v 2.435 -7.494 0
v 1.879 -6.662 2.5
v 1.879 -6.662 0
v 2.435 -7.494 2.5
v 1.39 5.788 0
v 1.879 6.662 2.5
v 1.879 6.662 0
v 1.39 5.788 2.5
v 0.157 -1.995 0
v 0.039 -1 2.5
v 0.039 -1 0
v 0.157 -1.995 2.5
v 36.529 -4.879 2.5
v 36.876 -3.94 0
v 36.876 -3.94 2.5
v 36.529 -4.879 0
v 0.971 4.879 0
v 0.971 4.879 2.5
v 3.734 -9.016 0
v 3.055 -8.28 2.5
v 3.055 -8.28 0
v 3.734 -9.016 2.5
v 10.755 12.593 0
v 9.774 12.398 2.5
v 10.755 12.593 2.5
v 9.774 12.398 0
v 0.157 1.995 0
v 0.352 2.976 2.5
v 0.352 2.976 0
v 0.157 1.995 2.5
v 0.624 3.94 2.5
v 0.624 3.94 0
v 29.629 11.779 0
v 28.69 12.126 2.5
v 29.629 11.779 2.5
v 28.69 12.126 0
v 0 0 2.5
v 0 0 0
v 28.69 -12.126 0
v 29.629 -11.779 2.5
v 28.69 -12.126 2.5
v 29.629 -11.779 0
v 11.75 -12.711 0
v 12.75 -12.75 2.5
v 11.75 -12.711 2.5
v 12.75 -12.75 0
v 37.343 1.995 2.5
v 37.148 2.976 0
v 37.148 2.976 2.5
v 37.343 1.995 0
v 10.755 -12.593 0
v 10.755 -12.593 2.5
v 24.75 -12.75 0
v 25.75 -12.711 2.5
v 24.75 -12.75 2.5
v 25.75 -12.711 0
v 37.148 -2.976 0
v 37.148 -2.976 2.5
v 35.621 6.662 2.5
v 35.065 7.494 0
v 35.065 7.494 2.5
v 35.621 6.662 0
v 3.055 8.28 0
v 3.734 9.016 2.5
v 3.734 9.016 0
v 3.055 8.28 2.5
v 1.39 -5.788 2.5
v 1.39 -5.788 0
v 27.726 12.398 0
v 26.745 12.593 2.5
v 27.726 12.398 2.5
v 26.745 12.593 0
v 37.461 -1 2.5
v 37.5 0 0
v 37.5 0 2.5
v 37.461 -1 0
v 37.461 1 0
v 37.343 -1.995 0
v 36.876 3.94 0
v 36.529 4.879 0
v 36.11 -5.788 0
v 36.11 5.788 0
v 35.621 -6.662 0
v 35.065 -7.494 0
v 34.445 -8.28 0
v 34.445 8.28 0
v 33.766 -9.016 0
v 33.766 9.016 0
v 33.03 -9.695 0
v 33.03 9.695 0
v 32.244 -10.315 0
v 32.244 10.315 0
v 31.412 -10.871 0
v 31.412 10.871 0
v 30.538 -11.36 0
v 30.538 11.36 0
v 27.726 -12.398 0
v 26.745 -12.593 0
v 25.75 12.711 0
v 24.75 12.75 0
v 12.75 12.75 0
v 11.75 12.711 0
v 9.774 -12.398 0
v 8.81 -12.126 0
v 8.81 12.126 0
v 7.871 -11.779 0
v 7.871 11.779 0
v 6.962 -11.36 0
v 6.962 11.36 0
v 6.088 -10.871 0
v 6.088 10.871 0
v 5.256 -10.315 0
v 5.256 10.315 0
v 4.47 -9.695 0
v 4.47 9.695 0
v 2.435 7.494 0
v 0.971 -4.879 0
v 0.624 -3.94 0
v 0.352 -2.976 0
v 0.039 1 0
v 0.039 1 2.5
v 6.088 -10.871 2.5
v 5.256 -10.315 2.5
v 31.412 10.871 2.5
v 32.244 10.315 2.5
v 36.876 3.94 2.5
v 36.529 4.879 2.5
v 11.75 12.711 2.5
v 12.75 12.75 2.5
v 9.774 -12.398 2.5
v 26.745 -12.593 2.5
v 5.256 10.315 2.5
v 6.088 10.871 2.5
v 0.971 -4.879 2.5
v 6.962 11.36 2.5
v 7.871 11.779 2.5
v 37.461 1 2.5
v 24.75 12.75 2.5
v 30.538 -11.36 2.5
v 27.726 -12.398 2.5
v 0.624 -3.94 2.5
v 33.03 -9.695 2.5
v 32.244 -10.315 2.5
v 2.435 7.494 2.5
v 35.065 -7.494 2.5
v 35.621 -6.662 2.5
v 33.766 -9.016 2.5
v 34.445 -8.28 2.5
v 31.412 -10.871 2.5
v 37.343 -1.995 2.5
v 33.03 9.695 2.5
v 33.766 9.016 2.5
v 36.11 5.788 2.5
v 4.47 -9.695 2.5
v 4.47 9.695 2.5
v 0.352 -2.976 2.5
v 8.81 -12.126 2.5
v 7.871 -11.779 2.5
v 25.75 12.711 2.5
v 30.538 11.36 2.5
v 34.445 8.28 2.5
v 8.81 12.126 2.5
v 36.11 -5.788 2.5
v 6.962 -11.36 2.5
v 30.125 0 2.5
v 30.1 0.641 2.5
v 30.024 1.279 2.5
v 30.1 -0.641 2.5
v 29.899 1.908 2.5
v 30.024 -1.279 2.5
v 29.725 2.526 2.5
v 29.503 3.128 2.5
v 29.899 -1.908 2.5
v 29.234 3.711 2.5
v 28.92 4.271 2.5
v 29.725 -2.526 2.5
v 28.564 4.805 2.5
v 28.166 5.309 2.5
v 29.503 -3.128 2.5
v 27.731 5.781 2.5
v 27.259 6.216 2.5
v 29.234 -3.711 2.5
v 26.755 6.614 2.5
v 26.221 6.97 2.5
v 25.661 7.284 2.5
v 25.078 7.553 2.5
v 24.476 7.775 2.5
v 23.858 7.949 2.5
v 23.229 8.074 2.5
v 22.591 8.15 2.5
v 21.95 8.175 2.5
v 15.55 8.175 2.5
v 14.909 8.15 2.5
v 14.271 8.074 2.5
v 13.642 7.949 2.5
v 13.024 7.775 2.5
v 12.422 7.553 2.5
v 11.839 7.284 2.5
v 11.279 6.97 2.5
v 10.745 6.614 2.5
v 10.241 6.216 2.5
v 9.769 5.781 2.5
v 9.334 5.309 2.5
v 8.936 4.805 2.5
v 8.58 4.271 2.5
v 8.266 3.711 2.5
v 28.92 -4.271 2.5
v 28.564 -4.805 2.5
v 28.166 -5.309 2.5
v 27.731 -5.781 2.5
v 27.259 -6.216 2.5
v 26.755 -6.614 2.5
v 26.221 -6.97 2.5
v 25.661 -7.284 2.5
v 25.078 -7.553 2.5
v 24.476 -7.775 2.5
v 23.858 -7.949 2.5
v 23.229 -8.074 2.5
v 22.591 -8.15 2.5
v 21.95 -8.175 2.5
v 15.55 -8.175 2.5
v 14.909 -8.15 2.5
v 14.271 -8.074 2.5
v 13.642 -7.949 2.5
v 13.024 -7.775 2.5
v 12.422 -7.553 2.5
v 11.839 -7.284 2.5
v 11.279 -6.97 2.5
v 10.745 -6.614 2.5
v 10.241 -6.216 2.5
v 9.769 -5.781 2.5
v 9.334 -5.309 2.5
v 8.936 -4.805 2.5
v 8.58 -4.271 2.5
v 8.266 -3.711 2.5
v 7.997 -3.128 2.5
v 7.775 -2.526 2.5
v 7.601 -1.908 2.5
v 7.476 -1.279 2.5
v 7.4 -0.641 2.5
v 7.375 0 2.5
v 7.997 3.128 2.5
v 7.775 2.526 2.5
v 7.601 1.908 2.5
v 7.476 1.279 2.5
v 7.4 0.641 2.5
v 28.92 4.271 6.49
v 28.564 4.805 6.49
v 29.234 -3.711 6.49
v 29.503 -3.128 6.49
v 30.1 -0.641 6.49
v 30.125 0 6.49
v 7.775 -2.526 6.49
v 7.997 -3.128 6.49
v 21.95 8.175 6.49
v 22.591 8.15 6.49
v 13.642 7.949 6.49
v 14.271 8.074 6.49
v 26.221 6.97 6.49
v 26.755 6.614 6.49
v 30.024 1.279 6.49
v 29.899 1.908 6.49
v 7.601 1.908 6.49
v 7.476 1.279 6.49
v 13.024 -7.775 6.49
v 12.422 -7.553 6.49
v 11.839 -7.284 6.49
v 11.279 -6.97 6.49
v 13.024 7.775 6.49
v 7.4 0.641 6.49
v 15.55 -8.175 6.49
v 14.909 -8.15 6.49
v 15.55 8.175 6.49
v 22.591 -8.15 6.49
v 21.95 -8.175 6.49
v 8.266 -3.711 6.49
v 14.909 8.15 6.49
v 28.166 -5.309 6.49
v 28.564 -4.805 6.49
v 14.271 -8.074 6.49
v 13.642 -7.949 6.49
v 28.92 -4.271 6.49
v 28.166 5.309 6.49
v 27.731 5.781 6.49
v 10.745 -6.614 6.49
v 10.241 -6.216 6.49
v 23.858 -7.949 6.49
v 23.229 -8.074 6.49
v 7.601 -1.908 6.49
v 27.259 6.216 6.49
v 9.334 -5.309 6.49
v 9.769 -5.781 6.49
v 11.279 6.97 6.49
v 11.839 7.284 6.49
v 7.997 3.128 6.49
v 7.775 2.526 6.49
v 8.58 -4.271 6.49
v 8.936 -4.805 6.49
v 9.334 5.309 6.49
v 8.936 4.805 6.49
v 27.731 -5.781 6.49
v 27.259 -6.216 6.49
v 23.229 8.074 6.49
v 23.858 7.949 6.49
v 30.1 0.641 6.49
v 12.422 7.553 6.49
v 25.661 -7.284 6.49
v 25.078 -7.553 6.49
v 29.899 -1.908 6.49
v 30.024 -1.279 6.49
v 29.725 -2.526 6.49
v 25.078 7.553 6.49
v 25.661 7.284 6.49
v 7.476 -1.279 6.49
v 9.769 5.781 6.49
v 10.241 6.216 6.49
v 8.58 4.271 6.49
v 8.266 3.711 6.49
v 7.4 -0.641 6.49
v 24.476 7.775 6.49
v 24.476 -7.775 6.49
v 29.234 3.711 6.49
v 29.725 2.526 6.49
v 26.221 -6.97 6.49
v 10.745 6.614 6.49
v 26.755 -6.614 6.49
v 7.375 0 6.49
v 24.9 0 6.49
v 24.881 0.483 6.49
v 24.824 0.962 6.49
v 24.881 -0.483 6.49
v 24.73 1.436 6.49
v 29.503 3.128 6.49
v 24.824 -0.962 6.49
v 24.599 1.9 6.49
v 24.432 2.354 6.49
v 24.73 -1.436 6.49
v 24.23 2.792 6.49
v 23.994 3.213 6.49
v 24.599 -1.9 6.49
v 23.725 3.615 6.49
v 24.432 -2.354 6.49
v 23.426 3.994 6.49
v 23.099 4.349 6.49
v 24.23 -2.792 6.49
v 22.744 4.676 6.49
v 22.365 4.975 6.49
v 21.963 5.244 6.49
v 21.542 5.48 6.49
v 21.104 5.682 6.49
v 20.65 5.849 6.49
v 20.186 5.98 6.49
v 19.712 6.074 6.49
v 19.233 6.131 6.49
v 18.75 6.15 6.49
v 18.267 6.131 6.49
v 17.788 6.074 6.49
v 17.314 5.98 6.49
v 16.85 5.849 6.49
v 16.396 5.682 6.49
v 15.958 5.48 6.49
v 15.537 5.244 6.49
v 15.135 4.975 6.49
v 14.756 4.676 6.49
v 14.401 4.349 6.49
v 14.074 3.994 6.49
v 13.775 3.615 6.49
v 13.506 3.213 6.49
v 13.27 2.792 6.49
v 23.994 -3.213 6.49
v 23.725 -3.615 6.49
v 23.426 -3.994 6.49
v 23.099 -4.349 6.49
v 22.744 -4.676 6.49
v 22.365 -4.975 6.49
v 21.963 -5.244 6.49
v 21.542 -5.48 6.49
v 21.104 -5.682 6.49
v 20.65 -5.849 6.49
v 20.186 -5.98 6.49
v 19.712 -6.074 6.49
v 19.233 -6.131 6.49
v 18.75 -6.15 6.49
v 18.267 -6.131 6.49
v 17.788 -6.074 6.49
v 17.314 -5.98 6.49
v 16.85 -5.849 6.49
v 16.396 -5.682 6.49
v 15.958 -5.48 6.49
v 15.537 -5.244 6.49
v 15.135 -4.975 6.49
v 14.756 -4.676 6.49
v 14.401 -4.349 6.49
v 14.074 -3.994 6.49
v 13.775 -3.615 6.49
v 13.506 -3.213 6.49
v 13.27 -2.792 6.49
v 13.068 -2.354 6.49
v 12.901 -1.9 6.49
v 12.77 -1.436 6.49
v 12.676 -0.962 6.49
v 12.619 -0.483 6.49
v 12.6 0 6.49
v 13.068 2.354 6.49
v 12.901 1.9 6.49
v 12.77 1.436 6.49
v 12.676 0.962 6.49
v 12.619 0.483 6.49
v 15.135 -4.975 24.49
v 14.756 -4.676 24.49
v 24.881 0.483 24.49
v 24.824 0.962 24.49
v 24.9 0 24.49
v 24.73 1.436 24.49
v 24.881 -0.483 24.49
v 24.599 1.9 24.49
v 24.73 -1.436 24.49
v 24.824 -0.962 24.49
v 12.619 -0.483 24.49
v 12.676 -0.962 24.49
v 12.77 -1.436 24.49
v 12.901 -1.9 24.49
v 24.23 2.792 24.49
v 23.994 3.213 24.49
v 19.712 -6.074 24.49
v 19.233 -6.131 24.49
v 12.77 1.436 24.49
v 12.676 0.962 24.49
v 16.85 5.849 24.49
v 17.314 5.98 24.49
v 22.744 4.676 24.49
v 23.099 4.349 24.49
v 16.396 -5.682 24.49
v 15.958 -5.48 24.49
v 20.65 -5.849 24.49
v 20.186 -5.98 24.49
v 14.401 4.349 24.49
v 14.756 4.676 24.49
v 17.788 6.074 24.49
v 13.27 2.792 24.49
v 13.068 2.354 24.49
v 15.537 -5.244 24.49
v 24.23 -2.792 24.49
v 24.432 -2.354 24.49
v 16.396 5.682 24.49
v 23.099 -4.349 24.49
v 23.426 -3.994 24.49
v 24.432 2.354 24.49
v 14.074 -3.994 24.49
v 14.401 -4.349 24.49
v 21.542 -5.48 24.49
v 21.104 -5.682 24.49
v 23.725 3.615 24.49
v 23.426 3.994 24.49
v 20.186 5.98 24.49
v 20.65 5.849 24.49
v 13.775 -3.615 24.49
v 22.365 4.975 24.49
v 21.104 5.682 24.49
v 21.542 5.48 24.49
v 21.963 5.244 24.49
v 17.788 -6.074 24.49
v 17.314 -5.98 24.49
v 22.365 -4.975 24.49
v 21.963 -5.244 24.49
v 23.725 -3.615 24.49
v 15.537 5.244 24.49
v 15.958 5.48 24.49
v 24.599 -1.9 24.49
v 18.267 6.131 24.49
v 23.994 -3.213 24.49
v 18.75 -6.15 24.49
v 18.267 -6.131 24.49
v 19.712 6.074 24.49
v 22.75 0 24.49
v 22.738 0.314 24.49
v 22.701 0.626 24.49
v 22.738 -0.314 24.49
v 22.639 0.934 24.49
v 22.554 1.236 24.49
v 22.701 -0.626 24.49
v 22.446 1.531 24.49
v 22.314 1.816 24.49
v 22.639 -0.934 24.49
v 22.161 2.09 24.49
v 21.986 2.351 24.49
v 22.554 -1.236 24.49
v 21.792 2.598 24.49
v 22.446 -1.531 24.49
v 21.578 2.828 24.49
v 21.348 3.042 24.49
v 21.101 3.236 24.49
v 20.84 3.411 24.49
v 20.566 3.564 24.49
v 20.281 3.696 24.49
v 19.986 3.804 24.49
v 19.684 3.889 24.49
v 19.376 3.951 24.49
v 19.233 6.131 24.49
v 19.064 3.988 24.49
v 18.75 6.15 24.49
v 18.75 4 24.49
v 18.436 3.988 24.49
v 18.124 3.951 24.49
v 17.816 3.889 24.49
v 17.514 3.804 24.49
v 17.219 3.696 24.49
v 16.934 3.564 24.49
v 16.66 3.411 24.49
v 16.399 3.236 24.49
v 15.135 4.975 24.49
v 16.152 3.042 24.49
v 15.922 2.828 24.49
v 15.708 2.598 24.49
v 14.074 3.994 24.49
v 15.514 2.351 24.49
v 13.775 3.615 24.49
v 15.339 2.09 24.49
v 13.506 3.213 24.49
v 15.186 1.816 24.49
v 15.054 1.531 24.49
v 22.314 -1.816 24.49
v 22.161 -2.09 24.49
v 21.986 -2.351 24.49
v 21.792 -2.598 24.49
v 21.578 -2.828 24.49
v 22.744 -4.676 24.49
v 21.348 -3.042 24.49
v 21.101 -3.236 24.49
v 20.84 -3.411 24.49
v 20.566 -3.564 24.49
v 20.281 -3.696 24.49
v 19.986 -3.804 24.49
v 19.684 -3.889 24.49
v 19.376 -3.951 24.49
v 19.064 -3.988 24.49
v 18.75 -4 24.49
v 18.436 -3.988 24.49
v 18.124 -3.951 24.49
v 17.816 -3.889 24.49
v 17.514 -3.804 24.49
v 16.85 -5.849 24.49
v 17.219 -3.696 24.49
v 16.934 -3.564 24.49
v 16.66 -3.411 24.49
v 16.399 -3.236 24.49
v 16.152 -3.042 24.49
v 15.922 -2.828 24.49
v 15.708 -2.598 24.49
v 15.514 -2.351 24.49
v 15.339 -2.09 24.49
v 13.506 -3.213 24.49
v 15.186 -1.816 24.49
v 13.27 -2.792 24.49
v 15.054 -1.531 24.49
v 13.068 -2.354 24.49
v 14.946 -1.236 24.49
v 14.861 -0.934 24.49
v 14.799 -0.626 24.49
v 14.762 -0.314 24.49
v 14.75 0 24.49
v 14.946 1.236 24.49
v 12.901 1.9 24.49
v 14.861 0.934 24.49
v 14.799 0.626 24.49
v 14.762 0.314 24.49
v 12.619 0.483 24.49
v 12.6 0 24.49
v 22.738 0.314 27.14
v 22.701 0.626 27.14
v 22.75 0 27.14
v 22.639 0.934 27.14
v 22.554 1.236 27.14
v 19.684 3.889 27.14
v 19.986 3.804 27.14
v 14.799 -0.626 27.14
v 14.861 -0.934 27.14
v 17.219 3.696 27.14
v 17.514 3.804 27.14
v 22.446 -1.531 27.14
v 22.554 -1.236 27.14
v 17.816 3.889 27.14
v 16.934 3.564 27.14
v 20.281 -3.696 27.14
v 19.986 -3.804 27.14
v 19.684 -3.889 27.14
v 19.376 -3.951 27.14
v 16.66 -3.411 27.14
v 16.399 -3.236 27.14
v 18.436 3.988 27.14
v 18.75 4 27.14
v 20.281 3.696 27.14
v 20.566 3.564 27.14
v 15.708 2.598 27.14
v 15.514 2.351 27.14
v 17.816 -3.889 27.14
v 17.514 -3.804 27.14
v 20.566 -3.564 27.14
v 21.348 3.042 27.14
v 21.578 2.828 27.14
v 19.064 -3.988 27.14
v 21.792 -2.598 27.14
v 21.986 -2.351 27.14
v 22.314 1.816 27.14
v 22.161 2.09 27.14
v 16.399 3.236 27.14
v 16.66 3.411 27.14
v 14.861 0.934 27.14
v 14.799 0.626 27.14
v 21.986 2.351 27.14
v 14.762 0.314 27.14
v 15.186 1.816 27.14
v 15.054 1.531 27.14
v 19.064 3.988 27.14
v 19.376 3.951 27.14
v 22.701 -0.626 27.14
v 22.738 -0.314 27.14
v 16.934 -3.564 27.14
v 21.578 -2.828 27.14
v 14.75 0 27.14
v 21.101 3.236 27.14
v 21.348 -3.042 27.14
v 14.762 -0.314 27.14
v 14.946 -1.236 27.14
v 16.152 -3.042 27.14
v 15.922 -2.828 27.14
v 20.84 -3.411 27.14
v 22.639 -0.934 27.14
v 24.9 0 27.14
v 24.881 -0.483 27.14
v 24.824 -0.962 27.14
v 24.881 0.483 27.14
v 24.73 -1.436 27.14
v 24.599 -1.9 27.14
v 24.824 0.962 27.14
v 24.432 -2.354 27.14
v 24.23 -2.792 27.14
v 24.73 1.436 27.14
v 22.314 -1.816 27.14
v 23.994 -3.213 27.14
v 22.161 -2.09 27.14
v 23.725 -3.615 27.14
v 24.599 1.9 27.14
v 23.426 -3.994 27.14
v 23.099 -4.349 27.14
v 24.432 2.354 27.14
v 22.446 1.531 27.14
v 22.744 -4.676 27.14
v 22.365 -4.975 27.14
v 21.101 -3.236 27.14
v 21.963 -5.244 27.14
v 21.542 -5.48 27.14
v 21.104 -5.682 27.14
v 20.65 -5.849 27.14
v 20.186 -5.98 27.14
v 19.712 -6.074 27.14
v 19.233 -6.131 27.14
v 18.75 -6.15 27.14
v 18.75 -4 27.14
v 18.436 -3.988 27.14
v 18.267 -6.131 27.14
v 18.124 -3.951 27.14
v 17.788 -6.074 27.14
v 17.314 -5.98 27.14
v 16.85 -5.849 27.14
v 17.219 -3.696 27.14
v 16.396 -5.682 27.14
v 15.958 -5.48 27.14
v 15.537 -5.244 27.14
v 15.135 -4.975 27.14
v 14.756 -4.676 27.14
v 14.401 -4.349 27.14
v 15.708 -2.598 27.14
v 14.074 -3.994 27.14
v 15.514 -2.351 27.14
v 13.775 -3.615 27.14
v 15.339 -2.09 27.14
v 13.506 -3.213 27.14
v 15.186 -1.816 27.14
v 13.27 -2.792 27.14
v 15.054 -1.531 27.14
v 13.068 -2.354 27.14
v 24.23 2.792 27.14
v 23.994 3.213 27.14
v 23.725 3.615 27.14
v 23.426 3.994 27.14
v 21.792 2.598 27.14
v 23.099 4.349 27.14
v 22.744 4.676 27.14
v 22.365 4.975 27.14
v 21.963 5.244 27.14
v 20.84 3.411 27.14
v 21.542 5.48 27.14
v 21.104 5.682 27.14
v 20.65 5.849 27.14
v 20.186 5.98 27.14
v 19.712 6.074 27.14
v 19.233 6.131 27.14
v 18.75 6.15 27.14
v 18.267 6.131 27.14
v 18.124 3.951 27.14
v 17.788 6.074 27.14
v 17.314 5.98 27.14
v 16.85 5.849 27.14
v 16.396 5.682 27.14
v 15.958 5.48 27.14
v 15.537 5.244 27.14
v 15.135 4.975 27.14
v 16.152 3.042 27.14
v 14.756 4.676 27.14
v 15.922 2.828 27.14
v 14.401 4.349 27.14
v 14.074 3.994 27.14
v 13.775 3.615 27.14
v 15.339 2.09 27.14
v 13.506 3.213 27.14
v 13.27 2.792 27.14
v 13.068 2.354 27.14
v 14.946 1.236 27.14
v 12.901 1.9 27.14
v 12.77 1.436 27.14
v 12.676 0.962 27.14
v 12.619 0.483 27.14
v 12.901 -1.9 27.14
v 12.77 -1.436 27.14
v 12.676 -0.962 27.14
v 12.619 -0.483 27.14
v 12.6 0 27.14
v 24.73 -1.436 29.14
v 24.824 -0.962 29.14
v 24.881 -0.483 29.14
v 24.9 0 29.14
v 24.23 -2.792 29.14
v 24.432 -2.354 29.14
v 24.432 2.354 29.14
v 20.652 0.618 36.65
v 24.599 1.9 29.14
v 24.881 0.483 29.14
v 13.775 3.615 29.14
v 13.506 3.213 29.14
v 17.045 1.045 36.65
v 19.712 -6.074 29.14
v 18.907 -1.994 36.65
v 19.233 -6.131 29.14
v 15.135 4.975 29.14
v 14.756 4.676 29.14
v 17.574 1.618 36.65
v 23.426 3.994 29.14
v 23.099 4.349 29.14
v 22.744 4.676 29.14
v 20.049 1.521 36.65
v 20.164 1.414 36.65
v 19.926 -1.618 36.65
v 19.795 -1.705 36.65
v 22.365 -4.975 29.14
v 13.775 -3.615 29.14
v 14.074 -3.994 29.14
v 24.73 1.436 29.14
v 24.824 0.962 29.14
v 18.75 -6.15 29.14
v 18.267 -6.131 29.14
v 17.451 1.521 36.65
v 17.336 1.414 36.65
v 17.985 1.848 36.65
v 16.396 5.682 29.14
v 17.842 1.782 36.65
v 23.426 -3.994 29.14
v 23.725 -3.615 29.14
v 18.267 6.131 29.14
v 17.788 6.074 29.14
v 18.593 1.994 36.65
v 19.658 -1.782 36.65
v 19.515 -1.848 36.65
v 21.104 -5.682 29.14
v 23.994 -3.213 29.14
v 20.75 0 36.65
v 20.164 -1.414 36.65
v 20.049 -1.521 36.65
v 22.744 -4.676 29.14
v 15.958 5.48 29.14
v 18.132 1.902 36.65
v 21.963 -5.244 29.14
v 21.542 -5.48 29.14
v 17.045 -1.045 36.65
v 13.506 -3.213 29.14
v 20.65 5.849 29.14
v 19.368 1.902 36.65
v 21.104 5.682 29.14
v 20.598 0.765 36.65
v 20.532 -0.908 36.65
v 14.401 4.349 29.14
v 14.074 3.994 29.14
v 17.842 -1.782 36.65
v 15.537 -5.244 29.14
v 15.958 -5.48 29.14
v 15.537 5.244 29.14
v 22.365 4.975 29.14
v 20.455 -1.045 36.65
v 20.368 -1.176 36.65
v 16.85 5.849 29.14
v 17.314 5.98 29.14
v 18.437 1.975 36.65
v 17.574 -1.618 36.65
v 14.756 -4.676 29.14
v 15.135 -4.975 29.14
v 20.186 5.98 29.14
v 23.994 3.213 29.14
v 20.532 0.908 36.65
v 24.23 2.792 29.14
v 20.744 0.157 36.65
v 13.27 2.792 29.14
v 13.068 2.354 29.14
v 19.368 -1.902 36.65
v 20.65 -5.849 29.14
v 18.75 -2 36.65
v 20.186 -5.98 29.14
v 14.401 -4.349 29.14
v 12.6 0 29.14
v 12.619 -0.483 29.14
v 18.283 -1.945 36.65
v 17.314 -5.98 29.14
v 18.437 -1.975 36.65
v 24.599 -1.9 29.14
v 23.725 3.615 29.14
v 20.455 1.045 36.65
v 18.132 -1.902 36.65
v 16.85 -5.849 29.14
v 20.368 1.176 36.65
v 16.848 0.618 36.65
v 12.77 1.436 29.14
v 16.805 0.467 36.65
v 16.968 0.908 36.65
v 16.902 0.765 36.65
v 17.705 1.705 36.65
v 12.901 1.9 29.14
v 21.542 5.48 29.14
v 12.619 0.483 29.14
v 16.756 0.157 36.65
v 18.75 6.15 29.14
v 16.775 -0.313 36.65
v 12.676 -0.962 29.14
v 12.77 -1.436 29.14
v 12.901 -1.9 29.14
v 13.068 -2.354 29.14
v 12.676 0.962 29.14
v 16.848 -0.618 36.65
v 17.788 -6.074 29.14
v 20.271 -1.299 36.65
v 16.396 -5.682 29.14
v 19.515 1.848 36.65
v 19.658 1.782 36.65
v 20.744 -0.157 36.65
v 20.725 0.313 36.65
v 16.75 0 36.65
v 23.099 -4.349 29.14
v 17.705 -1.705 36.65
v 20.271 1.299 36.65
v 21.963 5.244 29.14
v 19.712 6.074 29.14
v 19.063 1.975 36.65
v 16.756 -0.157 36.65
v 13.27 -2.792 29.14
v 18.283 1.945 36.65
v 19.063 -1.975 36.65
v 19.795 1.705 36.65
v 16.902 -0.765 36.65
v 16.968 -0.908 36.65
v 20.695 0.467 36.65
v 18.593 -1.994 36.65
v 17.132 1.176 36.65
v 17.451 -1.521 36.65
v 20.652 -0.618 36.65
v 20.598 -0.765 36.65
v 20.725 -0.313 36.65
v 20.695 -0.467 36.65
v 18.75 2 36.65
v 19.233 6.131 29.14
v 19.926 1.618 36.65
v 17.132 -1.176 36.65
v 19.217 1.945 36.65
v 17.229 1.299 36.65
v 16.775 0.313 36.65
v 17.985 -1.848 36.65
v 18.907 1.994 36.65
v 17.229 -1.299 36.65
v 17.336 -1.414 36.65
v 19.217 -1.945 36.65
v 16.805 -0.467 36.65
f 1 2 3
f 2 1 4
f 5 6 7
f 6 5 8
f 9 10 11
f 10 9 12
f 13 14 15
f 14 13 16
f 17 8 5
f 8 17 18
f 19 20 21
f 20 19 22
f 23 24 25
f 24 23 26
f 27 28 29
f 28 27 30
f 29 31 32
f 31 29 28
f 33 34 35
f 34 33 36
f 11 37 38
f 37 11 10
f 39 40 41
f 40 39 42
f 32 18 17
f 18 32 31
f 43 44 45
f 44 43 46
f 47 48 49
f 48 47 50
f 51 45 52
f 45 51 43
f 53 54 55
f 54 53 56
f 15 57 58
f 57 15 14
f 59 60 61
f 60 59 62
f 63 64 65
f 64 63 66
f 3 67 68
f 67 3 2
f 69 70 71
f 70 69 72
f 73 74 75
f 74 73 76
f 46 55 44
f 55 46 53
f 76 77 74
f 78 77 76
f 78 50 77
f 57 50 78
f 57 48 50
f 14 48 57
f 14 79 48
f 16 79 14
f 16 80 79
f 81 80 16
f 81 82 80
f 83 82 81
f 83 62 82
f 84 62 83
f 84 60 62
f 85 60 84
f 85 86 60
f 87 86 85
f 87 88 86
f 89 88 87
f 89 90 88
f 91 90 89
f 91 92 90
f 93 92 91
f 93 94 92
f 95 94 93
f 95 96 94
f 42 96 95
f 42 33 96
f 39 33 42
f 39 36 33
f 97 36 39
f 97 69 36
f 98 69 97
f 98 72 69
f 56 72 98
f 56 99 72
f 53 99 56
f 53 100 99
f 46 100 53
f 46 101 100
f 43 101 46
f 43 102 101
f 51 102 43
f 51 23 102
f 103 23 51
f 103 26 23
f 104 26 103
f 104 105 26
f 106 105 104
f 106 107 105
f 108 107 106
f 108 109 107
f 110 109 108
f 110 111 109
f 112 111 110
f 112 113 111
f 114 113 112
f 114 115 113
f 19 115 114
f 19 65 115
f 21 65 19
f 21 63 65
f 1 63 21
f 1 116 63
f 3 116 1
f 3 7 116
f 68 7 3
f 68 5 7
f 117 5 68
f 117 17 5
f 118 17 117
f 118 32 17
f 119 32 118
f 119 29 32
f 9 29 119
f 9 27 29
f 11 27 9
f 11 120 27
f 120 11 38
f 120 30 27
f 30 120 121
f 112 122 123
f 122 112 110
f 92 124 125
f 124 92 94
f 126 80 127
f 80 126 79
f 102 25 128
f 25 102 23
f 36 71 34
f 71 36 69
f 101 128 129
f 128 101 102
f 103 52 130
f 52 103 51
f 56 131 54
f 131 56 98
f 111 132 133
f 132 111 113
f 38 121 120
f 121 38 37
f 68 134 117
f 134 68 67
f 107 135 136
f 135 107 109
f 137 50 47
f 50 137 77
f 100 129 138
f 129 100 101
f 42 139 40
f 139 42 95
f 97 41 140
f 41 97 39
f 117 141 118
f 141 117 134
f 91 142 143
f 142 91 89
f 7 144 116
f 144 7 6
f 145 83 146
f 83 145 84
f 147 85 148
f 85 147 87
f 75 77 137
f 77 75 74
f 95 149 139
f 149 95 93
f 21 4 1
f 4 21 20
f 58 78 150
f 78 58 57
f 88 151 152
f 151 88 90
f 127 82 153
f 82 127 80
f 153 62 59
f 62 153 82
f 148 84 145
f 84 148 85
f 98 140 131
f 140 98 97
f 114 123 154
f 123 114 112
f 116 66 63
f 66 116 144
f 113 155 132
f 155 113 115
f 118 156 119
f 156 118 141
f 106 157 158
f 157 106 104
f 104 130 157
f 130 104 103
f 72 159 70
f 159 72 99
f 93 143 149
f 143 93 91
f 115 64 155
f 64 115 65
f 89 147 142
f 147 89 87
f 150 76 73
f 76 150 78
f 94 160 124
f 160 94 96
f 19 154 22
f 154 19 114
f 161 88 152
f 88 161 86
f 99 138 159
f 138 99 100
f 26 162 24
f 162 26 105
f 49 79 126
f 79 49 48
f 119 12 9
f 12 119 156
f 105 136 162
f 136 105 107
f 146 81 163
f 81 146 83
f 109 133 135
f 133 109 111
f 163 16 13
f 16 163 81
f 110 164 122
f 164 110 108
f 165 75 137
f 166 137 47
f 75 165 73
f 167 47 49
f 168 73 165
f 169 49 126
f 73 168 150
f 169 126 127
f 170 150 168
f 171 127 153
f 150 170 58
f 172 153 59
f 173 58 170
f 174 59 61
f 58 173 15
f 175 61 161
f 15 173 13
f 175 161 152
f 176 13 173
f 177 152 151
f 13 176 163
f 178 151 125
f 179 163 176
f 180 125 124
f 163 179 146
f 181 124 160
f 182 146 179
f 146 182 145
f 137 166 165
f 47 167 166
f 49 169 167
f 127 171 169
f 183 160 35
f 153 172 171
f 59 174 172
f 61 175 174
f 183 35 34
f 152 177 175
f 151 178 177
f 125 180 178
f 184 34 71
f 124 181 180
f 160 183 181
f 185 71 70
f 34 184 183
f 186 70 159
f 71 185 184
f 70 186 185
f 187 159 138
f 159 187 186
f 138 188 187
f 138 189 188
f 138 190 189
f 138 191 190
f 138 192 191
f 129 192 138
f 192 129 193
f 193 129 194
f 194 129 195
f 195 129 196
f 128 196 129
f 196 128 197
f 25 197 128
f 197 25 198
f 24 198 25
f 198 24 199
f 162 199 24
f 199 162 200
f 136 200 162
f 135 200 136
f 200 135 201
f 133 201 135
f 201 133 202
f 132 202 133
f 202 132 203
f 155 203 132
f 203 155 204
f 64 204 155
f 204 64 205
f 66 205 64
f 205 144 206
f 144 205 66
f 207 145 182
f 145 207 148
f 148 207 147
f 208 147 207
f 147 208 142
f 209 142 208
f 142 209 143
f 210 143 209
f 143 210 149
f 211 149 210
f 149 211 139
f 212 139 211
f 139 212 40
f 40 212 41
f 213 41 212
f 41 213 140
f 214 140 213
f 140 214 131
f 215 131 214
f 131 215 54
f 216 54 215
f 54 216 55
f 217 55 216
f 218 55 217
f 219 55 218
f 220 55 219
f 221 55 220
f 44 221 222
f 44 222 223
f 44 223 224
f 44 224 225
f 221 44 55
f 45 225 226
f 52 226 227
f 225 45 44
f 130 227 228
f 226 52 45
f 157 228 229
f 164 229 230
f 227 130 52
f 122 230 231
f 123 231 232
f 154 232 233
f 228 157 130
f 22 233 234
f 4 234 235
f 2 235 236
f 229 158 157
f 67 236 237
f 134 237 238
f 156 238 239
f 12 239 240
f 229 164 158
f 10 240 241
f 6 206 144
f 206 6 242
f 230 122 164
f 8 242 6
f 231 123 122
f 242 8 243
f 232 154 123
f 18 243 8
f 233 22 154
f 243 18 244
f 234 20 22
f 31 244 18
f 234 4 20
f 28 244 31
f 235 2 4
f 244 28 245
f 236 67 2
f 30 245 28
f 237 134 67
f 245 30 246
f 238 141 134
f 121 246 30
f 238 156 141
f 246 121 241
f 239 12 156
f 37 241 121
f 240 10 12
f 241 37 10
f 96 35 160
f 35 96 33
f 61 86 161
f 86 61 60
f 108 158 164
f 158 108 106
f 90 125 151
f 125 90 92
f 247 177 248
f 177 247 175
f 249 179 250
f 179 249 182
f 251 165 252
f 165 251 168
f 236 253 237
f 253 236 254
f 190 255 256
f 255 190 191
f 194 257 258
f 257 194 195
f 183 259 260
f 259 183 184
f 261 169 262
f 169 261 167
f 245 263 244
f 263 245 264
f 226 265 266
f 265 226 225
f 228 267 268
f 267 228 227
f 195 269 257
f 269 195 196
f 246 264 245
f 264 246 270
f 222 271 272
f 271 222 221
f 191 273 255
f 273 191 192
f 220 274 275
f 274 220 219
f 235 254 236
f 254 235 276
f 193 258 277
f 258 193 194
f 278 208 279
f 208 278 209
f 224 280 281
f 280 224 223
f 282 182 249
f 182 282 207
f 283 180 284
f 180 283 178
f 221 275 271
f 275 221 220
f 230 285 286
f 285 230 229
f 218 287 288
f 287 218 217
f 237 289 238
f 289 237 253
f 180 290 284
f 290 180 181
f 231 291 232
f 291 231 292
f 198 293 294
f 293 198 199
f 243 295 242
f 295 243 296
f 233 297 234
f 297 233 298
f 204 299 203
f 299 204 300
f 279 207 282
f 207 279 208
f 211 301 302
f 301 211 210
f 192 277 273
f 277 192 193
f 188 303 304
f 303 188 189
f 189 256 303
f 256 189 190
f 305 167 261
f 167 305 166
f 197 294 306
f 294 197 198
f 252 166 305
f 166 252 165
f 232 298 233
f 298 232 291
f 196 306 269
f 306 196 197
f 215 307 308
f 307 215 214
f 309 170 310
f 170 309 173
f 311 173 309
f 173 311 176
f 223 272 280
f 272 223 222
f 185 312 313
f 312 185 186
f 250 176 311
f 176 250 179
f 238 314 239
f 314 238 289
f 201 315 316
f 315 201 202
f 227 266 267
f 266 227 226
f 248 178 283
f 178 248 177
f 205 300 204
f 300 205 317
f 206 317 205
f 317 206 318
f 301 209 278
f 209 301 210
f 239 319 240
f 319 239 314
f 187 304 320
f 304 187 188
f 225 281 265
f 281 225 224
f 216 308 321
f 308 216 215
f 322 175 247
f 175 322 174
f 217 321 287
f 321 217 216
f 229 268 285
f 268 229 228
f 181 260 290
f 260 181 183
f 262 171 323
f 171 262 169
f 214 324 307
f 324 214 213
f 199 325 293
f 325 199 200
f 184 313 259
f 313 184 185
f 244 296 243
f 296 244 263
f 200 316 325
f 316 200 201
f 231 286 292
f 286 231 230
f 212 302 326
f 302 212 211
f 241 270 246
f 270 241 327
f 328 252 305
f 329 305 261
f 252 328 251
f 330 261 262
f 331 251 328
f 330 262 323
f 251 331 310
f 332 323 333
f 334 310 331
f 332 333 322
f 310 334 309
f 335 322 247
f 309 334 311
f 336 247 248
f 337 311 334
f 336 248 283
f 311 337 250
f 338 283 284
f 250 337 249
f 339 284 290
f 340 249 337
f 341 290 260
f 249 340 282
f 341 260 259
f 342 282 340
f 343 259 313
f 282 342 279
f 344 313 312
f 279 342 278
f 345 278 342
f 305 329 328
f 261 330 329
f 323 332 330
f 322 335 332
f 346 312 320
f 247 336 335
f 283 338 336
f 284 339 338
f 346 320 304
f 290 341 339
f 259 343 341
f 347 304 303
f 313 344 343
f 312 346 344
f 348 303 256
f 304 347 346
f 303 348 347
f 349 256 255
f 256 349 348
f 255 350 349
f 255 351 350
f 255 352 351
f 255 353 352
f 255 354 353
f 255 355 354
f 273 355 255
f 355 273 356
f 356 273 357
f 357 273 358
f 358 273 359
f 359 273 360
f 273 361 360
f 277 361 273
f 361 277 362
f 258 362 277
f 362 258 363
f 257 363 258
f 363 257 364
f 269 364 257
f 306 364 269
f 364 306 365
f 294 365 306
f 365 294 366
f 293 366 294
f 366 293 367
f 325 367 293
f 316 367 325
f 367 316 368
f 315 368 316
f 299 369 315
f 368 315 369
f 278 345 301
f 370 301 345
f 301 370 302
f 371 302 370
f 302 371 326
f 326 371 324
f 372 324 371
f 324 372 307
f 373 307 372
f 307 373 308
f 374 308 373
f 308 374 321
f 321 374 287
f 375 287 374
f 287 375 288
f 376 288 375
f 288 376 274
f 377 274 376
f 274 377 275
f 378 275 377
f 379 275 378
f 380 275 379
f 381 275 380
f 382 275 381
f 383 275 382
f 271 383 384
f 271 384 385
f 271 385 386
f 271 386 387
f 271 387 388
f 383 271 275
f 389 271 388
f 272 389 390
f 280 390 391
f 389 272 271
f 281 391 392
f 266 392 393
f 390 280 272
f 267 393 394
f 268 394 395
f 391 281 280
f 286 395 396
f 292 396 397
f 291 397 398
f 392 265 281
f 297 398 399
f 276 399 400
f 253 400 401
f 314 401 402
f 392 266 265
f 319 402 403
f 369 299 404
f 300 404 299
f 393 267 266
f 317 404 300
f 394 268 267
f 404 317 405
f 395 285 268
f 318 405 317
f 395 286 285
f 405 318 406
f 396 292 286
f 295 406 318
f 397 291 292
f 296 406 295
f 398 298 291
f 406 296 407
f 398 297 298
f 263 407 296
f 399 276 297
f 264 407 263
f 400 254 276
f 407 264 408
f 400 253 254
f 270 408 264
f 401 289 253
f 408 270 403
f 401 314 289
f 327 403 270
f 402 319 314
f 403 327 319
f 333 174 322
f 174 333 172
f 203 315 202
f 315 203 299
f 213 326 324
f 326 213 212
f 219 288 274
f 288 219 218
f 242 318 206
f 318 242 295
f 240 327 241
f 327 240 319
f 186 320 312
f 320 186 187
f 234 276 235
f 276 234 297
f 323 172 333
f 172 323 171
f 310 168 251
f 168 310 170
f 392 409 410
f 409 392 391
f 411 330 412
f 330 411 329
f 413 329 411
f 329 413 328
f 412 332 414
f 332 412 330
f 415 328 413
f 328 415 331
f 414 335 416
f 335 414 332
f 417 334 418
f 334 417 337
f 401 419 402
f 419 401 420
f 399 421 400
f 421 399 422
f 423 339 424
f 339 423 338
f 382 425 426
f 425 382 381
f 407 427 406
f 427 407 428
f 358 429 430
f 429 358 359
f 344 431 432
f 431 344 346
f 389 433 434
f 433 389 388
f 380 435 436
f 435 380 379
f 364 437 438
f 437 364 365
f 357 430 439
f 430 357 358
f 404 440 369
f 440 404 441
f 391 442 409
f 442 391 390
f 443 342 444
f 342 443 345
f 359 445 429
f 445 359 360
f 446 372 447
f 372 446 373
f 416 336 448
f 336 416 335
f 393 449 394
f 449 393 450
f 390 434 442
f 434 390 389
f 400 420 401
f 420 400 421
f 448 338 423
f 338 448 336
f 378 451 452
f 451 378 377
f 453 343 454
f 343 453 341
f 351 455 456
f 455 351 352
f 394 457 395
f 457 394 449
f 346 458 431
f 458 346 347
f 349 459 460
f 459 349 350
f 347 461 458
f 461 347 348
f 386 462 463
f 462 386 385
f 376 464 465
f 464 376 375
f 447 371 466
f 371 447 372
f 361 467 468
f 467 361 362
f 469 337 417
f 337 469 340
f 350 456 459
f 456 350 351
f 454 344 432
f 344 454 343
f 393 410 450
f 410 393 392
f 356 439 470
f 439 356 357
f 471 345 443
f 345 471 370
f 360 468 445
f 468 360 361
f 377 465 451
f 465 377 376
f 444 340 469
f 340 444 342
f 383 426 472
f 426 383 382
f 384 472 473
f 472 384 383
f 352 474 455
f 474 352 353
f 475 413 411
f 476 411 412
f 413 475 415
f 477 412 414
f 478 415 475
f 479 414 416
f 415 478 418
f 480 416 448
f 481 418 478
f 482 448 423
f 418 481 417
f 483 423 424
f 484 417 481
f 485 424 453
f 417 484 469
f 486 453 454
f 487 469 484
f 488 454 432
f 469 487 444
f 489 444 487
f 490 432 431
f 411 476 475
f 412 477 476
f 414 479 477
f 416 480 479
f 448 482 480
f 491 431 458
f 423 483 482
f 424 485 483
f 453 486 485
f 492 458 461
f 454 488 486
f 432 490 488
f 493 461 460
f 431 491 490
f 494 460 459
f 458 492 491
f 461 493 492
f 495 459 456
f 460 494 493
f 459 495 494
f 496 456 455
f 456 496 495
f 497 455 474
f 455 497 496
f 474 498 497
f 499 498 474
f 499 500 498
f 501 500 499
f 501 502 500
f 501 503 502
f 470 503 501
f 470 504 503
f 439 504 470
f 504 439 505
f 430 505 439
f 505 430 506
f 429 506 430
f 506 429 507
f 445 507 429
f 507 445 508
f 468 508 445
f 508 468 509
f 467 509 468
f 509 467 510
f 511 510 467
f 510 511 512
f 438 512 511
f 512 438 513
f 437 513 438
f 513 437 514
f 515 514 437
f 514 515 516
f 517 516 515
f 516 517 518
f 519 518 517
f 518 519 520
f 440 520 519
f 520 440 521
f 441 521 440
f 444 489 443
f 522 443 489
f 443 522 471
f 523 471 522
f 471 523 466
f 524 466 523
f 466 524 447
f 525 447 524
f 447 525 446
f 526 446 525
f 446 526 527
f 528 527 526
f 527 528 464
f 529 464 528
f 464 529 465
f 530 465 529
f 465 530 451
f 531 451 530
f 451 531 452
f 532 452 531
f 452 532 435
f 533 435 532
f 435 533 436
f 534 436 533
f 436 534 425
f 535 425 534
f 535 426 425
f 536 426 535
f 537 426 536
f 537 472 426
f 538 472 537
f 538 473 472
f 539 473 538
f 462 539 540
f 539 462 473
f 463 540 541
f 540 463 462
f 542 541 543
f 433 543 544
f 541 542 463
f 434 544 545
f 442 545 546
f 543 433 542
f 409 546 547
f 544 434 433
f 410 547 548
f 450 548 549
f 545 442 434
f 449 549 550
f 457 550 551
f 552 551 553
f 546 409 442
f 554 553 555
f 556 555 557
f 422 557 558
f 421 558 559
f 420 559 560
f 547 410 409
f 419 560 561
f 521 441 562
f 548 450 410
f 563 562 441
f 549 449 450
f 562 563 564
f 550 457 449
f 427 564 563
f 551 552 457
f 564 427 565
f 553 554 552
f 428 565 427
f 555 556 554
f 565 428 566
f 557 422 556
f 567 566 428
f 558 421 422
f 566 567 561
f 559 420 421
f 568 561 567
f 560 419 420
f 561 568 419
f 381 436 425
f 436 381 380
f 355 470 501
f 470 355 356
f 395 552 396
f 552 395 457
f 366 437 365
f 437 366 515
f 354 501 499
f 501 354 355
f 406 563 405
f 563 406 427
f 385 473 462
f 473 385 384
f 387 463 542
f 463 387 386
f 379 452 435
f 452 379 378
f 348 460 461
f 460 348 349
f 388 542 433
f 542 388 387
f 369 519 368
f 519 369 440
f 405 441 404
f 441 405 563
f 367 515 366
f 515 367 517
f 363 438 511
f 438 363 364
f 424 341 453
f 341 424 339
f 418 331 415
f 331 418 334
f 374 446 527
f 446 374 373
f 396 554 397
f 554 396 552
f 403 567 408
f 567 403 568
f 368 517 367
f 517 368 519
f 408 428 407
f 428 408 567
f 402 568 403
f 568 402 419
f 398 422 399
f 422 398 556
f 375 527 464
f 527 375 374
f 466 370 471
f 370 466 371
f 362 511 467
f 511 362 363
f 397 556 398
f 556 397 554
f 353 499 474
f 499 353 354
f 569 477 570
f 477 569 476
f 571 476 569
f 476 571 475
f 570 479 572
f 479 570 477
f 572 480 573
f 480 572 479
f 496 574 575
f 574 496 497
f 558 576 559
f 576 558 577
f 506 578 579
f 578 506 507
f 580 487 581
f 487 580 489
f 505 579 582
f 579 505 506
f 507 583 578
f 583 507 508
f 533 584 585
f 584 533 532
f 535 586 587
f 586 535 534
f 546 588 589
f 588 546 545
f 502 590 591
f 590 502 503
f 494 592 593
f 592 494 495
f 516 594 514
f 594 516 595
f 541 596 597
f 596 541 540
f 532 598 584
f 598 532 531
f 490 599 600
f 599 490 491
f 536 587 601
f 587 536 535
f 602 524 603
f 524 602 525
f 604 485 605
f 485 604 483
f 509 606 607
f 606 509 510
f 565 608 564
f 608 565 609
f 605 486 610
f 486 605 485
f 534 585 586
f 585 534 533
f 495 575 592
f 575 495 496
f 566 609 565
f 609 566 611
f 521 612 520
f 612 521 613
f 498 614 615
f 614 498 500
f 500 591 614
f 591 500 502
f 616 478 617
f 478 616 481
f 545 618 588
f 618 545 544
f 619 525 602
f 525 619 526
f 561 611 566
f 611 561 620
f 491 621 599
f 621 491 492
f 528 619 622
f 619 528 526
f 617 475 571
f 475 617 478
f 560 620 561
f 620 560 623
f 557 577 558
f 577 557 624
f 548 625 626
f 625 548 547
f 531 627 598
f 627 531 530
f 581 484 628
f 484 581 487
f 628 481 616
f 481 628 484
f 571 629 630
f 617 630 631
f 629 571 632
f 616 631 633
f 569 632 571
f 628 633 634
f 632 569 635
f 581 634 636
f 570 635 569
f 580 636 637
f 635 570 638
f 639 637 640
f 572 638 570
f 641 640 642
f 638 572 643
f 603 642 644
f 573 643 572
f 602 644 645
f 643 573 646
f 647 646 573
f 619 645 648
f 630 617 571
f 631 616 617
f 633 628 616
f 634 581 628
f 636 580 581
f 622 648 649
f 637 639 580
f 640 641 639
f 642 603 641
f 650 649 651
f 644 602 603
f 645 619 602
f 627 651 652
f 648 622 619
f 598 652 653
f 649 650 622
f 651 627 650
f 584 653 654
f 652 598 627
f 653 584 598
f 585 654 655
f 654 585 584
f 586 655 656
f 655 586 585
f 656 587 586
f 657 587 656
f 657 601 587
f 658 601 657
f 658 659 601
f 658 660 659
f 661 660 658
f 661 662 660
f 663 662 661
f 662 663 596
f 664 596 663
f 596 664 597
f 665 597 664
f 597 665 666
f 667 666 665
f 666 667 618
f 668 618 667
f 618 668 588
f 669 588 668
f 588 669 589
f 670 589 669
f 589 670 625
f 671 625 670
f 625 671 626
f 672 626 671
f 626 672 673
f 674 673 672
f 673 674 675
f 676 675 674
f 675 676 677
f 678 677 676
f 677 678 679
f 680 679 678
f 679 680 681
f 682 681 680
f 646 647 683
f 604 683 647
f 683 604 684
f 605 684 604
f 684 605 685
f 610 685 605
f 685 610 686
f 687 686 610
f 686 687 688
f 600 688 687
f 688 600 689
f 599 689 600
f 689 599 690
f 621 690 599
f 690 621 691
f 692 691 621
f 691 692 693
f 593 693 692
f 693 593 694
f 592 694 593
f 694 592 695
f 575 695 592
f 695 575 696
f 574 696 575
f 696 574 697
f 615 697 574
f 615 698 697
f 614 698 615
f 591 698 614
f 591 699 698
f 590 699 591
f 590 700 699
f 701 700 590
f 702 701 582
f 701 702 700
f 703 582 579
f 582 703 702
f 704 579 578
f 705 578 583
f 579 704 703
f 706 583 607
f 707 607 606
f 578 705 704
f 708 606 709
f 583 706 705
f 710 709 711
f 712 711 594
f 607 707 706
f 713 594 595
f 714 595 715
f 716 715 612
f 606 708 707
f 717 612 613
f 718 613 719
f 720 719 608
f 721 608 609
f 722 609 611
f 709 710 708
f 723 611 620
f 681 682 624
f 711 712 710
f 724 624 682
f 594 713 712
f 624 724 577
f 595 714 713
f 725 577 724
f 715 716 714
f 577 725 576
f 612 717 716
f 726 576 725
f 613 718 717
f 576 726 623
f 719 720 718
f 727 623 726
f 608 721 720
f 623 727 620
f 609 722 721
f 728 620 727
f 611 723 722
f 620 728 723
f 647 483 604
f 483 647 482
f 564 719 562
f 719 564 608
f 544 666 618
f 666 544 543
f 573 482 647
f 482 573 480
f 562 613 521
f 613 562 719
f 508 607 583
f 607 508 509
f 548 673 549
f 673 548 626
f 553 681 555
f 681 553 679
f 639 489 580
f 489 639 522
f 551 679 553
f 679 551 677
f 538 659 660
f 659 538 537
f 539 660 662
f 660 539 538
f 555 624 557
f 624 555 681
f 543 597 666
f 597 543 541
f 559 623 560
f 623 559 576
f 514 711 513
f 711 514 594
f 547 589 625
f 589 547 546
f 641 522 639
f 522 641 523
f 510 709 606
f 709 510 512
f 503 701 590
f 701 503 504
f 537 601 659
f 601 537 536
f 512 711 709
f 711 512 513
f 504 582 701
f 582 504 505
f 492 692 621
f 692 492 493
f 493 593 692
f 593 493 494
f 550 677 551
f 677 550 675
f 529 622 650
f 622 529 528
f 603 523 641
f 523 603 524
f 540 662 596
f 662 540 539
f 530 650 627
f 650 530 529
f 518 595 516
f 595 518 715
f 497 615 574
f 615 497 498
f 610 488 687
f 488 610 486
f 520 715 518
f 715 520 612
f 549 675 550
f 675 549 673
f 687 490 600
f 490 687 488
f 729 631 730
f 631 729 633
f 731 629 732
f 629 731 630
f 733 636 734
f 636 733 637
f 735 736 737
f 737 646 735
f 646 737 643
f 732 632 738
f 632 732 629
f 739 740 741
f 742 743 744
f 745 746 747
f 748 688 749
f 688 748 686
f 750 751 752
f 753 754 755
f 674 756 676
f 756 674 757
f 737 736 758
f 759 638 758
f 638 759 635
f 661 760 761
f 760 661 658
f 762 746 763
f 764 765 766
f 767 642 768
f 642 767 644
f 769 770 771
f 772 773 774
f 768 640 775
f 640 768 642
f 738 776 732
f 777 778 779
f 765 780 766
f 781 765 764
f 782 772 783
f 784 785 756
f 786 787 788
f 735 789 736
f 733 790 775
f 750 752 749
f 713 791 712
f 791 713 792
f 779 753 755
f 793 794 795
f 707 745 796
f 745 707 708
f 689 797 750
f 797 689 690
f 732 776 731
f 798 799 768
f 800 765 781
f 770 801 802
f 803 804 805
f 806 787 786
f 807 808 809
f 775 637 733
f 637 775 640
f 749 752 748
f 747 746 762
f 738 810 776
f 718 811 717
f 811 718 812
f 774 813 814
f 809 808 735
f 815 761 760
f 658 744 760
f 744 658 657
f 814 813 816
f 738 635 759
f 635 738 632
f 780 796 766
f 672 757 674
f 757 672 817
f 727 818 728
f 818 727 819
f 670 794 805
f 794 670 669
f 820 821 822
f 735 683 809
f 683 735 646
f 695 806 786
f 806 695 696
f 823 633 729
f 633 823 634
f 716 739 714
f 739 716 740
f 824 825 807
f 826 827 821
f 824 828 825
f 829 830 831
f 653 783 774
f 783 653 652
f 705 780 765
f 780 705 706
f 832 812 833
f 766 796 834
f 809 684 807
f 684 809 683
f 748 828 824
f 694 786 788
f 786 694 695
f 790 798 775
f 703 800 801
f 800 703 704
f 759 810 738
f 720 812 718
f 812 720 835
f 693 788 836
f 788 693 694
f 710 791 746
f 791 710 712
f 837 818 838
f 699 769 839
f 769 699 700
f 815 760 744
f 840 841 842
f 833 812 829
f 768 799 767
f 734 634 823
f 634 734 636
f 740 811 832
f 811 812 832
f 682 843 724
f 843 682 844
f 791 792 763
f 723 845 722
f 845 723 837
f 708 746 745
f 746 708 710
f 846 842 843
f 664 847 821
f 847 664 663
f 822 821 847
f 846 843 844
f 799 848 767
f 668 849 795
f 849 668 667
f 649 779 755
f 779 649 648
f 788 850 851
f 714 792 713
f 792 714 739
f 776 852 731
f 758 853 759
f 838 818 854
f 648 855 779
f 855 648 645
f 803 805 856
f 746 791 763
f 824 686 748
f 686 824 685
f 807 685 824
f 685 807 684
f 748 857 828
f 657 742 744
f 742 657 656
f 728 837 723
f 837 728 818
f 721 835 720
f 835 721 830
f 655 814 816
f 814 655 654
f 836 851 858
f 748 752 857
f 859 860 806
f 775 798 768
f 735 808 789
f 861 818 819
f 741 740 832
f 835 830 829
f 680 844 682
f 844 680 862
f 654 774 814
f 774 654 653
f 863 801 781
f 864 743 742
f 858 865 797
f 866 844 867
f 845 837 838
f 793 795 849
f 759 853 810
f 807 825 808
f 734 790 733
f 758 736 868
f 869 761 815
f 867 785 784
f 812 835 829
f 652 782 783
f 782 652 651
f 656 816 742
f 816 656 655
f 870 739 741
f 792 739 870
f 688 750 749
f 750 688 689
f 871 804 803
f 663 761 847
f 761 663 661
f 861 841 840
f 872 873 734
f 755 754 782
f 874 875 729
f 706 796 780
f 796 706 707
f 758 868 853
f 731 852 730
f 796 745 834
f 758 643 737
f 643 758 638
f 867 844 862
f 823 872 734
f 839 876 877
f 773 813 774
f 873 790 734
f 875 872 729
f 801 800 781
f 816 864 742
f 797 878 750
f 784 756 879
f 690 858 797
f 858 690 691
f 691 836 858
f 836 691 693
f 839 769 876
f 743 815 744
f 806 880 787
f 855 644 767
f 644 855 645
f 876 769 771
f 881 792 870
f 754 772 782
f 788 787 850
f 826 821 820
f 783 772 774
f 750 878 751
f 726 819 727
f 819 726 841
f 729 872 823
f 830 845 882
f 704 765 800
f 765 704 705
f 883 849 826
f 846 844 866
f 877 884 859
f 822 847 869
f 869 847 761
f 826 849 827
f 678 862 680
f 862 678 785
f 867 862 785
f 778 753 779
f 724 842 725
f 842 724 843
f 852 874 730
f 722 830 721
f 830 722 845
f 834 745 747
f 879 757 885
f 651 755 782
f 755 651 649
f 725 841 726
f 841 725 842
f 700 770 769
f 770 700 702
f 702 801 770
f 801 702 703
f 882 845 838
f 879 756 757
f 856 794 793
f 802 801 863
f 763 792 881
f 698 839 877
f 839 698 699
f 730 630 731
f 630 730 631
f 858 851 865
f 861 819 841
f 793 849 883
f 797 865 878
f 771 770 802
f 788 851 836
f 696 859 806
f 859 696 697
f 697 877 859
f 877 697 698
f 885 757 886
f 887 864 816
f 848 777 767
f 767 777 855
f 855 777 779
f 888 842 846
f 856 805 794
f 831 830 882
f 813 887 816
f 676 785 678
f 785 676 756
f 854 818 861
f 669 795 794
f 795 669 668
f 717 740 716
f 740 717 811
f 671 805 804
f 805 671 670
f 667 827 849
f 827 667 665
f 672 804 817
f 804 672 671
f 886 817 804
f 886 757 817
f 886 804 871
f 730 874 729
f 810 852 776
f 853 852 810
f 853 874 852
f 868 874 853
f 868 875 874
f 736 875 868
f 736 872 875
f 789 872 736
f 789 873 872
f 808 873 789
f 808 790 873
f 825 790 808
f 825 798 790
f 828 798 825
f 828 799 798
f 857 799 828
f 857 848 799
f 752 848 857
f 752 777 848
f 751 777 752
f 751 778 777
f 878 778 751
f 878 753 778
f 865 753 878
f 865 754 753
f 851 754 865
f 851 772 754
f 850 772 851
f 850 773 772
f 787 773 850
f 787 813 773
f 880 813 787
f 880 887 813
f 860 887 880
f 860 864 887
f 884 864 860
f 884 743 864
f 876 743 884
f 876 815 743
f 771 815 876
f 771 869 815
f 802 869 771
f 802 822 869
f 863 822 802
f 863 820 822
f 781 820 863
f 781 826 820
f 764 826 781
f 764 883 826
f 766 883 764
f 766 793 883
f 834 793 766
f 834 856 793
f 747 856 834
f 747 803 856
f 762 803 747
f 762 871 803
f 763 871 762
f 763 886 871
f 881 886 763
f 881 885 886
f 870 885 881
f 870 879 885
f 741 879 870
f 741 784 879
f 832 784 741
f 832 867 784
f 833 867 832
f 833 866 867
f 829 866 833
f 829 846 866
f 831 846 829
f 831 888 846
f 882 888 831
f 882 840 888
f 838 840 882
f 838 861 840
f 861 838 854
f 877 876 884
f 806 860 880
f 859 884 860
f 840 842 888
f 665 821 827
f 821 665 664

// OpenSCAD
$fn=80;

base_width=25.5;
base_length = 37.5;
base_thickness = 2.5;

ledge_width = 16.35;
ledge_length = 22.75;
ledge_thickness = 4;

pin_dia = 12.30;
pin_height = 18;

pin_collar_dia = 8;
pin_collar_height = 2.65;


taper_height = 6;
translate([base_width/2,0,0]) hull(){
    cylinder(r=base_width/2, h=base_thickness);
    translate([base_length - base_width,0,0,]) cylinder(r=base_width/2, h=base_thickness);
}


translate([(base_length - ledge_length)/2,0,base_thickness-0.01])    translate([ledge_width/2  ,0,0]){
 hull(){
    cylinder(r=ledge_width/2, h = ledge_thickness);
    translate([ledge_length - ledge_width,0,0,]) cylinder (r=ledge_width/2, h = ledge_thickness);
}
}

translate([base_length/2, 0, base_thickness+ ledge_thickness - 0.01]) cylinder(r=pin_dia/2, h = pin_height);
translate([base_length/2, 0, base_thickness + ledge_thickness + pin_height - 0.01]) cylinder(r=pin_collar_dia/2, h=pin_collar_height);


translate([base_length/2, 0, base_thickness + ledge_thickness + pin_height + pin_collar_height - 0.01])  {
hull() {
  cylinder(r=pin_dia/2, h=2);
   translate([0,0,9.5]) cylinder(h=0.01,r=2);
}
}
